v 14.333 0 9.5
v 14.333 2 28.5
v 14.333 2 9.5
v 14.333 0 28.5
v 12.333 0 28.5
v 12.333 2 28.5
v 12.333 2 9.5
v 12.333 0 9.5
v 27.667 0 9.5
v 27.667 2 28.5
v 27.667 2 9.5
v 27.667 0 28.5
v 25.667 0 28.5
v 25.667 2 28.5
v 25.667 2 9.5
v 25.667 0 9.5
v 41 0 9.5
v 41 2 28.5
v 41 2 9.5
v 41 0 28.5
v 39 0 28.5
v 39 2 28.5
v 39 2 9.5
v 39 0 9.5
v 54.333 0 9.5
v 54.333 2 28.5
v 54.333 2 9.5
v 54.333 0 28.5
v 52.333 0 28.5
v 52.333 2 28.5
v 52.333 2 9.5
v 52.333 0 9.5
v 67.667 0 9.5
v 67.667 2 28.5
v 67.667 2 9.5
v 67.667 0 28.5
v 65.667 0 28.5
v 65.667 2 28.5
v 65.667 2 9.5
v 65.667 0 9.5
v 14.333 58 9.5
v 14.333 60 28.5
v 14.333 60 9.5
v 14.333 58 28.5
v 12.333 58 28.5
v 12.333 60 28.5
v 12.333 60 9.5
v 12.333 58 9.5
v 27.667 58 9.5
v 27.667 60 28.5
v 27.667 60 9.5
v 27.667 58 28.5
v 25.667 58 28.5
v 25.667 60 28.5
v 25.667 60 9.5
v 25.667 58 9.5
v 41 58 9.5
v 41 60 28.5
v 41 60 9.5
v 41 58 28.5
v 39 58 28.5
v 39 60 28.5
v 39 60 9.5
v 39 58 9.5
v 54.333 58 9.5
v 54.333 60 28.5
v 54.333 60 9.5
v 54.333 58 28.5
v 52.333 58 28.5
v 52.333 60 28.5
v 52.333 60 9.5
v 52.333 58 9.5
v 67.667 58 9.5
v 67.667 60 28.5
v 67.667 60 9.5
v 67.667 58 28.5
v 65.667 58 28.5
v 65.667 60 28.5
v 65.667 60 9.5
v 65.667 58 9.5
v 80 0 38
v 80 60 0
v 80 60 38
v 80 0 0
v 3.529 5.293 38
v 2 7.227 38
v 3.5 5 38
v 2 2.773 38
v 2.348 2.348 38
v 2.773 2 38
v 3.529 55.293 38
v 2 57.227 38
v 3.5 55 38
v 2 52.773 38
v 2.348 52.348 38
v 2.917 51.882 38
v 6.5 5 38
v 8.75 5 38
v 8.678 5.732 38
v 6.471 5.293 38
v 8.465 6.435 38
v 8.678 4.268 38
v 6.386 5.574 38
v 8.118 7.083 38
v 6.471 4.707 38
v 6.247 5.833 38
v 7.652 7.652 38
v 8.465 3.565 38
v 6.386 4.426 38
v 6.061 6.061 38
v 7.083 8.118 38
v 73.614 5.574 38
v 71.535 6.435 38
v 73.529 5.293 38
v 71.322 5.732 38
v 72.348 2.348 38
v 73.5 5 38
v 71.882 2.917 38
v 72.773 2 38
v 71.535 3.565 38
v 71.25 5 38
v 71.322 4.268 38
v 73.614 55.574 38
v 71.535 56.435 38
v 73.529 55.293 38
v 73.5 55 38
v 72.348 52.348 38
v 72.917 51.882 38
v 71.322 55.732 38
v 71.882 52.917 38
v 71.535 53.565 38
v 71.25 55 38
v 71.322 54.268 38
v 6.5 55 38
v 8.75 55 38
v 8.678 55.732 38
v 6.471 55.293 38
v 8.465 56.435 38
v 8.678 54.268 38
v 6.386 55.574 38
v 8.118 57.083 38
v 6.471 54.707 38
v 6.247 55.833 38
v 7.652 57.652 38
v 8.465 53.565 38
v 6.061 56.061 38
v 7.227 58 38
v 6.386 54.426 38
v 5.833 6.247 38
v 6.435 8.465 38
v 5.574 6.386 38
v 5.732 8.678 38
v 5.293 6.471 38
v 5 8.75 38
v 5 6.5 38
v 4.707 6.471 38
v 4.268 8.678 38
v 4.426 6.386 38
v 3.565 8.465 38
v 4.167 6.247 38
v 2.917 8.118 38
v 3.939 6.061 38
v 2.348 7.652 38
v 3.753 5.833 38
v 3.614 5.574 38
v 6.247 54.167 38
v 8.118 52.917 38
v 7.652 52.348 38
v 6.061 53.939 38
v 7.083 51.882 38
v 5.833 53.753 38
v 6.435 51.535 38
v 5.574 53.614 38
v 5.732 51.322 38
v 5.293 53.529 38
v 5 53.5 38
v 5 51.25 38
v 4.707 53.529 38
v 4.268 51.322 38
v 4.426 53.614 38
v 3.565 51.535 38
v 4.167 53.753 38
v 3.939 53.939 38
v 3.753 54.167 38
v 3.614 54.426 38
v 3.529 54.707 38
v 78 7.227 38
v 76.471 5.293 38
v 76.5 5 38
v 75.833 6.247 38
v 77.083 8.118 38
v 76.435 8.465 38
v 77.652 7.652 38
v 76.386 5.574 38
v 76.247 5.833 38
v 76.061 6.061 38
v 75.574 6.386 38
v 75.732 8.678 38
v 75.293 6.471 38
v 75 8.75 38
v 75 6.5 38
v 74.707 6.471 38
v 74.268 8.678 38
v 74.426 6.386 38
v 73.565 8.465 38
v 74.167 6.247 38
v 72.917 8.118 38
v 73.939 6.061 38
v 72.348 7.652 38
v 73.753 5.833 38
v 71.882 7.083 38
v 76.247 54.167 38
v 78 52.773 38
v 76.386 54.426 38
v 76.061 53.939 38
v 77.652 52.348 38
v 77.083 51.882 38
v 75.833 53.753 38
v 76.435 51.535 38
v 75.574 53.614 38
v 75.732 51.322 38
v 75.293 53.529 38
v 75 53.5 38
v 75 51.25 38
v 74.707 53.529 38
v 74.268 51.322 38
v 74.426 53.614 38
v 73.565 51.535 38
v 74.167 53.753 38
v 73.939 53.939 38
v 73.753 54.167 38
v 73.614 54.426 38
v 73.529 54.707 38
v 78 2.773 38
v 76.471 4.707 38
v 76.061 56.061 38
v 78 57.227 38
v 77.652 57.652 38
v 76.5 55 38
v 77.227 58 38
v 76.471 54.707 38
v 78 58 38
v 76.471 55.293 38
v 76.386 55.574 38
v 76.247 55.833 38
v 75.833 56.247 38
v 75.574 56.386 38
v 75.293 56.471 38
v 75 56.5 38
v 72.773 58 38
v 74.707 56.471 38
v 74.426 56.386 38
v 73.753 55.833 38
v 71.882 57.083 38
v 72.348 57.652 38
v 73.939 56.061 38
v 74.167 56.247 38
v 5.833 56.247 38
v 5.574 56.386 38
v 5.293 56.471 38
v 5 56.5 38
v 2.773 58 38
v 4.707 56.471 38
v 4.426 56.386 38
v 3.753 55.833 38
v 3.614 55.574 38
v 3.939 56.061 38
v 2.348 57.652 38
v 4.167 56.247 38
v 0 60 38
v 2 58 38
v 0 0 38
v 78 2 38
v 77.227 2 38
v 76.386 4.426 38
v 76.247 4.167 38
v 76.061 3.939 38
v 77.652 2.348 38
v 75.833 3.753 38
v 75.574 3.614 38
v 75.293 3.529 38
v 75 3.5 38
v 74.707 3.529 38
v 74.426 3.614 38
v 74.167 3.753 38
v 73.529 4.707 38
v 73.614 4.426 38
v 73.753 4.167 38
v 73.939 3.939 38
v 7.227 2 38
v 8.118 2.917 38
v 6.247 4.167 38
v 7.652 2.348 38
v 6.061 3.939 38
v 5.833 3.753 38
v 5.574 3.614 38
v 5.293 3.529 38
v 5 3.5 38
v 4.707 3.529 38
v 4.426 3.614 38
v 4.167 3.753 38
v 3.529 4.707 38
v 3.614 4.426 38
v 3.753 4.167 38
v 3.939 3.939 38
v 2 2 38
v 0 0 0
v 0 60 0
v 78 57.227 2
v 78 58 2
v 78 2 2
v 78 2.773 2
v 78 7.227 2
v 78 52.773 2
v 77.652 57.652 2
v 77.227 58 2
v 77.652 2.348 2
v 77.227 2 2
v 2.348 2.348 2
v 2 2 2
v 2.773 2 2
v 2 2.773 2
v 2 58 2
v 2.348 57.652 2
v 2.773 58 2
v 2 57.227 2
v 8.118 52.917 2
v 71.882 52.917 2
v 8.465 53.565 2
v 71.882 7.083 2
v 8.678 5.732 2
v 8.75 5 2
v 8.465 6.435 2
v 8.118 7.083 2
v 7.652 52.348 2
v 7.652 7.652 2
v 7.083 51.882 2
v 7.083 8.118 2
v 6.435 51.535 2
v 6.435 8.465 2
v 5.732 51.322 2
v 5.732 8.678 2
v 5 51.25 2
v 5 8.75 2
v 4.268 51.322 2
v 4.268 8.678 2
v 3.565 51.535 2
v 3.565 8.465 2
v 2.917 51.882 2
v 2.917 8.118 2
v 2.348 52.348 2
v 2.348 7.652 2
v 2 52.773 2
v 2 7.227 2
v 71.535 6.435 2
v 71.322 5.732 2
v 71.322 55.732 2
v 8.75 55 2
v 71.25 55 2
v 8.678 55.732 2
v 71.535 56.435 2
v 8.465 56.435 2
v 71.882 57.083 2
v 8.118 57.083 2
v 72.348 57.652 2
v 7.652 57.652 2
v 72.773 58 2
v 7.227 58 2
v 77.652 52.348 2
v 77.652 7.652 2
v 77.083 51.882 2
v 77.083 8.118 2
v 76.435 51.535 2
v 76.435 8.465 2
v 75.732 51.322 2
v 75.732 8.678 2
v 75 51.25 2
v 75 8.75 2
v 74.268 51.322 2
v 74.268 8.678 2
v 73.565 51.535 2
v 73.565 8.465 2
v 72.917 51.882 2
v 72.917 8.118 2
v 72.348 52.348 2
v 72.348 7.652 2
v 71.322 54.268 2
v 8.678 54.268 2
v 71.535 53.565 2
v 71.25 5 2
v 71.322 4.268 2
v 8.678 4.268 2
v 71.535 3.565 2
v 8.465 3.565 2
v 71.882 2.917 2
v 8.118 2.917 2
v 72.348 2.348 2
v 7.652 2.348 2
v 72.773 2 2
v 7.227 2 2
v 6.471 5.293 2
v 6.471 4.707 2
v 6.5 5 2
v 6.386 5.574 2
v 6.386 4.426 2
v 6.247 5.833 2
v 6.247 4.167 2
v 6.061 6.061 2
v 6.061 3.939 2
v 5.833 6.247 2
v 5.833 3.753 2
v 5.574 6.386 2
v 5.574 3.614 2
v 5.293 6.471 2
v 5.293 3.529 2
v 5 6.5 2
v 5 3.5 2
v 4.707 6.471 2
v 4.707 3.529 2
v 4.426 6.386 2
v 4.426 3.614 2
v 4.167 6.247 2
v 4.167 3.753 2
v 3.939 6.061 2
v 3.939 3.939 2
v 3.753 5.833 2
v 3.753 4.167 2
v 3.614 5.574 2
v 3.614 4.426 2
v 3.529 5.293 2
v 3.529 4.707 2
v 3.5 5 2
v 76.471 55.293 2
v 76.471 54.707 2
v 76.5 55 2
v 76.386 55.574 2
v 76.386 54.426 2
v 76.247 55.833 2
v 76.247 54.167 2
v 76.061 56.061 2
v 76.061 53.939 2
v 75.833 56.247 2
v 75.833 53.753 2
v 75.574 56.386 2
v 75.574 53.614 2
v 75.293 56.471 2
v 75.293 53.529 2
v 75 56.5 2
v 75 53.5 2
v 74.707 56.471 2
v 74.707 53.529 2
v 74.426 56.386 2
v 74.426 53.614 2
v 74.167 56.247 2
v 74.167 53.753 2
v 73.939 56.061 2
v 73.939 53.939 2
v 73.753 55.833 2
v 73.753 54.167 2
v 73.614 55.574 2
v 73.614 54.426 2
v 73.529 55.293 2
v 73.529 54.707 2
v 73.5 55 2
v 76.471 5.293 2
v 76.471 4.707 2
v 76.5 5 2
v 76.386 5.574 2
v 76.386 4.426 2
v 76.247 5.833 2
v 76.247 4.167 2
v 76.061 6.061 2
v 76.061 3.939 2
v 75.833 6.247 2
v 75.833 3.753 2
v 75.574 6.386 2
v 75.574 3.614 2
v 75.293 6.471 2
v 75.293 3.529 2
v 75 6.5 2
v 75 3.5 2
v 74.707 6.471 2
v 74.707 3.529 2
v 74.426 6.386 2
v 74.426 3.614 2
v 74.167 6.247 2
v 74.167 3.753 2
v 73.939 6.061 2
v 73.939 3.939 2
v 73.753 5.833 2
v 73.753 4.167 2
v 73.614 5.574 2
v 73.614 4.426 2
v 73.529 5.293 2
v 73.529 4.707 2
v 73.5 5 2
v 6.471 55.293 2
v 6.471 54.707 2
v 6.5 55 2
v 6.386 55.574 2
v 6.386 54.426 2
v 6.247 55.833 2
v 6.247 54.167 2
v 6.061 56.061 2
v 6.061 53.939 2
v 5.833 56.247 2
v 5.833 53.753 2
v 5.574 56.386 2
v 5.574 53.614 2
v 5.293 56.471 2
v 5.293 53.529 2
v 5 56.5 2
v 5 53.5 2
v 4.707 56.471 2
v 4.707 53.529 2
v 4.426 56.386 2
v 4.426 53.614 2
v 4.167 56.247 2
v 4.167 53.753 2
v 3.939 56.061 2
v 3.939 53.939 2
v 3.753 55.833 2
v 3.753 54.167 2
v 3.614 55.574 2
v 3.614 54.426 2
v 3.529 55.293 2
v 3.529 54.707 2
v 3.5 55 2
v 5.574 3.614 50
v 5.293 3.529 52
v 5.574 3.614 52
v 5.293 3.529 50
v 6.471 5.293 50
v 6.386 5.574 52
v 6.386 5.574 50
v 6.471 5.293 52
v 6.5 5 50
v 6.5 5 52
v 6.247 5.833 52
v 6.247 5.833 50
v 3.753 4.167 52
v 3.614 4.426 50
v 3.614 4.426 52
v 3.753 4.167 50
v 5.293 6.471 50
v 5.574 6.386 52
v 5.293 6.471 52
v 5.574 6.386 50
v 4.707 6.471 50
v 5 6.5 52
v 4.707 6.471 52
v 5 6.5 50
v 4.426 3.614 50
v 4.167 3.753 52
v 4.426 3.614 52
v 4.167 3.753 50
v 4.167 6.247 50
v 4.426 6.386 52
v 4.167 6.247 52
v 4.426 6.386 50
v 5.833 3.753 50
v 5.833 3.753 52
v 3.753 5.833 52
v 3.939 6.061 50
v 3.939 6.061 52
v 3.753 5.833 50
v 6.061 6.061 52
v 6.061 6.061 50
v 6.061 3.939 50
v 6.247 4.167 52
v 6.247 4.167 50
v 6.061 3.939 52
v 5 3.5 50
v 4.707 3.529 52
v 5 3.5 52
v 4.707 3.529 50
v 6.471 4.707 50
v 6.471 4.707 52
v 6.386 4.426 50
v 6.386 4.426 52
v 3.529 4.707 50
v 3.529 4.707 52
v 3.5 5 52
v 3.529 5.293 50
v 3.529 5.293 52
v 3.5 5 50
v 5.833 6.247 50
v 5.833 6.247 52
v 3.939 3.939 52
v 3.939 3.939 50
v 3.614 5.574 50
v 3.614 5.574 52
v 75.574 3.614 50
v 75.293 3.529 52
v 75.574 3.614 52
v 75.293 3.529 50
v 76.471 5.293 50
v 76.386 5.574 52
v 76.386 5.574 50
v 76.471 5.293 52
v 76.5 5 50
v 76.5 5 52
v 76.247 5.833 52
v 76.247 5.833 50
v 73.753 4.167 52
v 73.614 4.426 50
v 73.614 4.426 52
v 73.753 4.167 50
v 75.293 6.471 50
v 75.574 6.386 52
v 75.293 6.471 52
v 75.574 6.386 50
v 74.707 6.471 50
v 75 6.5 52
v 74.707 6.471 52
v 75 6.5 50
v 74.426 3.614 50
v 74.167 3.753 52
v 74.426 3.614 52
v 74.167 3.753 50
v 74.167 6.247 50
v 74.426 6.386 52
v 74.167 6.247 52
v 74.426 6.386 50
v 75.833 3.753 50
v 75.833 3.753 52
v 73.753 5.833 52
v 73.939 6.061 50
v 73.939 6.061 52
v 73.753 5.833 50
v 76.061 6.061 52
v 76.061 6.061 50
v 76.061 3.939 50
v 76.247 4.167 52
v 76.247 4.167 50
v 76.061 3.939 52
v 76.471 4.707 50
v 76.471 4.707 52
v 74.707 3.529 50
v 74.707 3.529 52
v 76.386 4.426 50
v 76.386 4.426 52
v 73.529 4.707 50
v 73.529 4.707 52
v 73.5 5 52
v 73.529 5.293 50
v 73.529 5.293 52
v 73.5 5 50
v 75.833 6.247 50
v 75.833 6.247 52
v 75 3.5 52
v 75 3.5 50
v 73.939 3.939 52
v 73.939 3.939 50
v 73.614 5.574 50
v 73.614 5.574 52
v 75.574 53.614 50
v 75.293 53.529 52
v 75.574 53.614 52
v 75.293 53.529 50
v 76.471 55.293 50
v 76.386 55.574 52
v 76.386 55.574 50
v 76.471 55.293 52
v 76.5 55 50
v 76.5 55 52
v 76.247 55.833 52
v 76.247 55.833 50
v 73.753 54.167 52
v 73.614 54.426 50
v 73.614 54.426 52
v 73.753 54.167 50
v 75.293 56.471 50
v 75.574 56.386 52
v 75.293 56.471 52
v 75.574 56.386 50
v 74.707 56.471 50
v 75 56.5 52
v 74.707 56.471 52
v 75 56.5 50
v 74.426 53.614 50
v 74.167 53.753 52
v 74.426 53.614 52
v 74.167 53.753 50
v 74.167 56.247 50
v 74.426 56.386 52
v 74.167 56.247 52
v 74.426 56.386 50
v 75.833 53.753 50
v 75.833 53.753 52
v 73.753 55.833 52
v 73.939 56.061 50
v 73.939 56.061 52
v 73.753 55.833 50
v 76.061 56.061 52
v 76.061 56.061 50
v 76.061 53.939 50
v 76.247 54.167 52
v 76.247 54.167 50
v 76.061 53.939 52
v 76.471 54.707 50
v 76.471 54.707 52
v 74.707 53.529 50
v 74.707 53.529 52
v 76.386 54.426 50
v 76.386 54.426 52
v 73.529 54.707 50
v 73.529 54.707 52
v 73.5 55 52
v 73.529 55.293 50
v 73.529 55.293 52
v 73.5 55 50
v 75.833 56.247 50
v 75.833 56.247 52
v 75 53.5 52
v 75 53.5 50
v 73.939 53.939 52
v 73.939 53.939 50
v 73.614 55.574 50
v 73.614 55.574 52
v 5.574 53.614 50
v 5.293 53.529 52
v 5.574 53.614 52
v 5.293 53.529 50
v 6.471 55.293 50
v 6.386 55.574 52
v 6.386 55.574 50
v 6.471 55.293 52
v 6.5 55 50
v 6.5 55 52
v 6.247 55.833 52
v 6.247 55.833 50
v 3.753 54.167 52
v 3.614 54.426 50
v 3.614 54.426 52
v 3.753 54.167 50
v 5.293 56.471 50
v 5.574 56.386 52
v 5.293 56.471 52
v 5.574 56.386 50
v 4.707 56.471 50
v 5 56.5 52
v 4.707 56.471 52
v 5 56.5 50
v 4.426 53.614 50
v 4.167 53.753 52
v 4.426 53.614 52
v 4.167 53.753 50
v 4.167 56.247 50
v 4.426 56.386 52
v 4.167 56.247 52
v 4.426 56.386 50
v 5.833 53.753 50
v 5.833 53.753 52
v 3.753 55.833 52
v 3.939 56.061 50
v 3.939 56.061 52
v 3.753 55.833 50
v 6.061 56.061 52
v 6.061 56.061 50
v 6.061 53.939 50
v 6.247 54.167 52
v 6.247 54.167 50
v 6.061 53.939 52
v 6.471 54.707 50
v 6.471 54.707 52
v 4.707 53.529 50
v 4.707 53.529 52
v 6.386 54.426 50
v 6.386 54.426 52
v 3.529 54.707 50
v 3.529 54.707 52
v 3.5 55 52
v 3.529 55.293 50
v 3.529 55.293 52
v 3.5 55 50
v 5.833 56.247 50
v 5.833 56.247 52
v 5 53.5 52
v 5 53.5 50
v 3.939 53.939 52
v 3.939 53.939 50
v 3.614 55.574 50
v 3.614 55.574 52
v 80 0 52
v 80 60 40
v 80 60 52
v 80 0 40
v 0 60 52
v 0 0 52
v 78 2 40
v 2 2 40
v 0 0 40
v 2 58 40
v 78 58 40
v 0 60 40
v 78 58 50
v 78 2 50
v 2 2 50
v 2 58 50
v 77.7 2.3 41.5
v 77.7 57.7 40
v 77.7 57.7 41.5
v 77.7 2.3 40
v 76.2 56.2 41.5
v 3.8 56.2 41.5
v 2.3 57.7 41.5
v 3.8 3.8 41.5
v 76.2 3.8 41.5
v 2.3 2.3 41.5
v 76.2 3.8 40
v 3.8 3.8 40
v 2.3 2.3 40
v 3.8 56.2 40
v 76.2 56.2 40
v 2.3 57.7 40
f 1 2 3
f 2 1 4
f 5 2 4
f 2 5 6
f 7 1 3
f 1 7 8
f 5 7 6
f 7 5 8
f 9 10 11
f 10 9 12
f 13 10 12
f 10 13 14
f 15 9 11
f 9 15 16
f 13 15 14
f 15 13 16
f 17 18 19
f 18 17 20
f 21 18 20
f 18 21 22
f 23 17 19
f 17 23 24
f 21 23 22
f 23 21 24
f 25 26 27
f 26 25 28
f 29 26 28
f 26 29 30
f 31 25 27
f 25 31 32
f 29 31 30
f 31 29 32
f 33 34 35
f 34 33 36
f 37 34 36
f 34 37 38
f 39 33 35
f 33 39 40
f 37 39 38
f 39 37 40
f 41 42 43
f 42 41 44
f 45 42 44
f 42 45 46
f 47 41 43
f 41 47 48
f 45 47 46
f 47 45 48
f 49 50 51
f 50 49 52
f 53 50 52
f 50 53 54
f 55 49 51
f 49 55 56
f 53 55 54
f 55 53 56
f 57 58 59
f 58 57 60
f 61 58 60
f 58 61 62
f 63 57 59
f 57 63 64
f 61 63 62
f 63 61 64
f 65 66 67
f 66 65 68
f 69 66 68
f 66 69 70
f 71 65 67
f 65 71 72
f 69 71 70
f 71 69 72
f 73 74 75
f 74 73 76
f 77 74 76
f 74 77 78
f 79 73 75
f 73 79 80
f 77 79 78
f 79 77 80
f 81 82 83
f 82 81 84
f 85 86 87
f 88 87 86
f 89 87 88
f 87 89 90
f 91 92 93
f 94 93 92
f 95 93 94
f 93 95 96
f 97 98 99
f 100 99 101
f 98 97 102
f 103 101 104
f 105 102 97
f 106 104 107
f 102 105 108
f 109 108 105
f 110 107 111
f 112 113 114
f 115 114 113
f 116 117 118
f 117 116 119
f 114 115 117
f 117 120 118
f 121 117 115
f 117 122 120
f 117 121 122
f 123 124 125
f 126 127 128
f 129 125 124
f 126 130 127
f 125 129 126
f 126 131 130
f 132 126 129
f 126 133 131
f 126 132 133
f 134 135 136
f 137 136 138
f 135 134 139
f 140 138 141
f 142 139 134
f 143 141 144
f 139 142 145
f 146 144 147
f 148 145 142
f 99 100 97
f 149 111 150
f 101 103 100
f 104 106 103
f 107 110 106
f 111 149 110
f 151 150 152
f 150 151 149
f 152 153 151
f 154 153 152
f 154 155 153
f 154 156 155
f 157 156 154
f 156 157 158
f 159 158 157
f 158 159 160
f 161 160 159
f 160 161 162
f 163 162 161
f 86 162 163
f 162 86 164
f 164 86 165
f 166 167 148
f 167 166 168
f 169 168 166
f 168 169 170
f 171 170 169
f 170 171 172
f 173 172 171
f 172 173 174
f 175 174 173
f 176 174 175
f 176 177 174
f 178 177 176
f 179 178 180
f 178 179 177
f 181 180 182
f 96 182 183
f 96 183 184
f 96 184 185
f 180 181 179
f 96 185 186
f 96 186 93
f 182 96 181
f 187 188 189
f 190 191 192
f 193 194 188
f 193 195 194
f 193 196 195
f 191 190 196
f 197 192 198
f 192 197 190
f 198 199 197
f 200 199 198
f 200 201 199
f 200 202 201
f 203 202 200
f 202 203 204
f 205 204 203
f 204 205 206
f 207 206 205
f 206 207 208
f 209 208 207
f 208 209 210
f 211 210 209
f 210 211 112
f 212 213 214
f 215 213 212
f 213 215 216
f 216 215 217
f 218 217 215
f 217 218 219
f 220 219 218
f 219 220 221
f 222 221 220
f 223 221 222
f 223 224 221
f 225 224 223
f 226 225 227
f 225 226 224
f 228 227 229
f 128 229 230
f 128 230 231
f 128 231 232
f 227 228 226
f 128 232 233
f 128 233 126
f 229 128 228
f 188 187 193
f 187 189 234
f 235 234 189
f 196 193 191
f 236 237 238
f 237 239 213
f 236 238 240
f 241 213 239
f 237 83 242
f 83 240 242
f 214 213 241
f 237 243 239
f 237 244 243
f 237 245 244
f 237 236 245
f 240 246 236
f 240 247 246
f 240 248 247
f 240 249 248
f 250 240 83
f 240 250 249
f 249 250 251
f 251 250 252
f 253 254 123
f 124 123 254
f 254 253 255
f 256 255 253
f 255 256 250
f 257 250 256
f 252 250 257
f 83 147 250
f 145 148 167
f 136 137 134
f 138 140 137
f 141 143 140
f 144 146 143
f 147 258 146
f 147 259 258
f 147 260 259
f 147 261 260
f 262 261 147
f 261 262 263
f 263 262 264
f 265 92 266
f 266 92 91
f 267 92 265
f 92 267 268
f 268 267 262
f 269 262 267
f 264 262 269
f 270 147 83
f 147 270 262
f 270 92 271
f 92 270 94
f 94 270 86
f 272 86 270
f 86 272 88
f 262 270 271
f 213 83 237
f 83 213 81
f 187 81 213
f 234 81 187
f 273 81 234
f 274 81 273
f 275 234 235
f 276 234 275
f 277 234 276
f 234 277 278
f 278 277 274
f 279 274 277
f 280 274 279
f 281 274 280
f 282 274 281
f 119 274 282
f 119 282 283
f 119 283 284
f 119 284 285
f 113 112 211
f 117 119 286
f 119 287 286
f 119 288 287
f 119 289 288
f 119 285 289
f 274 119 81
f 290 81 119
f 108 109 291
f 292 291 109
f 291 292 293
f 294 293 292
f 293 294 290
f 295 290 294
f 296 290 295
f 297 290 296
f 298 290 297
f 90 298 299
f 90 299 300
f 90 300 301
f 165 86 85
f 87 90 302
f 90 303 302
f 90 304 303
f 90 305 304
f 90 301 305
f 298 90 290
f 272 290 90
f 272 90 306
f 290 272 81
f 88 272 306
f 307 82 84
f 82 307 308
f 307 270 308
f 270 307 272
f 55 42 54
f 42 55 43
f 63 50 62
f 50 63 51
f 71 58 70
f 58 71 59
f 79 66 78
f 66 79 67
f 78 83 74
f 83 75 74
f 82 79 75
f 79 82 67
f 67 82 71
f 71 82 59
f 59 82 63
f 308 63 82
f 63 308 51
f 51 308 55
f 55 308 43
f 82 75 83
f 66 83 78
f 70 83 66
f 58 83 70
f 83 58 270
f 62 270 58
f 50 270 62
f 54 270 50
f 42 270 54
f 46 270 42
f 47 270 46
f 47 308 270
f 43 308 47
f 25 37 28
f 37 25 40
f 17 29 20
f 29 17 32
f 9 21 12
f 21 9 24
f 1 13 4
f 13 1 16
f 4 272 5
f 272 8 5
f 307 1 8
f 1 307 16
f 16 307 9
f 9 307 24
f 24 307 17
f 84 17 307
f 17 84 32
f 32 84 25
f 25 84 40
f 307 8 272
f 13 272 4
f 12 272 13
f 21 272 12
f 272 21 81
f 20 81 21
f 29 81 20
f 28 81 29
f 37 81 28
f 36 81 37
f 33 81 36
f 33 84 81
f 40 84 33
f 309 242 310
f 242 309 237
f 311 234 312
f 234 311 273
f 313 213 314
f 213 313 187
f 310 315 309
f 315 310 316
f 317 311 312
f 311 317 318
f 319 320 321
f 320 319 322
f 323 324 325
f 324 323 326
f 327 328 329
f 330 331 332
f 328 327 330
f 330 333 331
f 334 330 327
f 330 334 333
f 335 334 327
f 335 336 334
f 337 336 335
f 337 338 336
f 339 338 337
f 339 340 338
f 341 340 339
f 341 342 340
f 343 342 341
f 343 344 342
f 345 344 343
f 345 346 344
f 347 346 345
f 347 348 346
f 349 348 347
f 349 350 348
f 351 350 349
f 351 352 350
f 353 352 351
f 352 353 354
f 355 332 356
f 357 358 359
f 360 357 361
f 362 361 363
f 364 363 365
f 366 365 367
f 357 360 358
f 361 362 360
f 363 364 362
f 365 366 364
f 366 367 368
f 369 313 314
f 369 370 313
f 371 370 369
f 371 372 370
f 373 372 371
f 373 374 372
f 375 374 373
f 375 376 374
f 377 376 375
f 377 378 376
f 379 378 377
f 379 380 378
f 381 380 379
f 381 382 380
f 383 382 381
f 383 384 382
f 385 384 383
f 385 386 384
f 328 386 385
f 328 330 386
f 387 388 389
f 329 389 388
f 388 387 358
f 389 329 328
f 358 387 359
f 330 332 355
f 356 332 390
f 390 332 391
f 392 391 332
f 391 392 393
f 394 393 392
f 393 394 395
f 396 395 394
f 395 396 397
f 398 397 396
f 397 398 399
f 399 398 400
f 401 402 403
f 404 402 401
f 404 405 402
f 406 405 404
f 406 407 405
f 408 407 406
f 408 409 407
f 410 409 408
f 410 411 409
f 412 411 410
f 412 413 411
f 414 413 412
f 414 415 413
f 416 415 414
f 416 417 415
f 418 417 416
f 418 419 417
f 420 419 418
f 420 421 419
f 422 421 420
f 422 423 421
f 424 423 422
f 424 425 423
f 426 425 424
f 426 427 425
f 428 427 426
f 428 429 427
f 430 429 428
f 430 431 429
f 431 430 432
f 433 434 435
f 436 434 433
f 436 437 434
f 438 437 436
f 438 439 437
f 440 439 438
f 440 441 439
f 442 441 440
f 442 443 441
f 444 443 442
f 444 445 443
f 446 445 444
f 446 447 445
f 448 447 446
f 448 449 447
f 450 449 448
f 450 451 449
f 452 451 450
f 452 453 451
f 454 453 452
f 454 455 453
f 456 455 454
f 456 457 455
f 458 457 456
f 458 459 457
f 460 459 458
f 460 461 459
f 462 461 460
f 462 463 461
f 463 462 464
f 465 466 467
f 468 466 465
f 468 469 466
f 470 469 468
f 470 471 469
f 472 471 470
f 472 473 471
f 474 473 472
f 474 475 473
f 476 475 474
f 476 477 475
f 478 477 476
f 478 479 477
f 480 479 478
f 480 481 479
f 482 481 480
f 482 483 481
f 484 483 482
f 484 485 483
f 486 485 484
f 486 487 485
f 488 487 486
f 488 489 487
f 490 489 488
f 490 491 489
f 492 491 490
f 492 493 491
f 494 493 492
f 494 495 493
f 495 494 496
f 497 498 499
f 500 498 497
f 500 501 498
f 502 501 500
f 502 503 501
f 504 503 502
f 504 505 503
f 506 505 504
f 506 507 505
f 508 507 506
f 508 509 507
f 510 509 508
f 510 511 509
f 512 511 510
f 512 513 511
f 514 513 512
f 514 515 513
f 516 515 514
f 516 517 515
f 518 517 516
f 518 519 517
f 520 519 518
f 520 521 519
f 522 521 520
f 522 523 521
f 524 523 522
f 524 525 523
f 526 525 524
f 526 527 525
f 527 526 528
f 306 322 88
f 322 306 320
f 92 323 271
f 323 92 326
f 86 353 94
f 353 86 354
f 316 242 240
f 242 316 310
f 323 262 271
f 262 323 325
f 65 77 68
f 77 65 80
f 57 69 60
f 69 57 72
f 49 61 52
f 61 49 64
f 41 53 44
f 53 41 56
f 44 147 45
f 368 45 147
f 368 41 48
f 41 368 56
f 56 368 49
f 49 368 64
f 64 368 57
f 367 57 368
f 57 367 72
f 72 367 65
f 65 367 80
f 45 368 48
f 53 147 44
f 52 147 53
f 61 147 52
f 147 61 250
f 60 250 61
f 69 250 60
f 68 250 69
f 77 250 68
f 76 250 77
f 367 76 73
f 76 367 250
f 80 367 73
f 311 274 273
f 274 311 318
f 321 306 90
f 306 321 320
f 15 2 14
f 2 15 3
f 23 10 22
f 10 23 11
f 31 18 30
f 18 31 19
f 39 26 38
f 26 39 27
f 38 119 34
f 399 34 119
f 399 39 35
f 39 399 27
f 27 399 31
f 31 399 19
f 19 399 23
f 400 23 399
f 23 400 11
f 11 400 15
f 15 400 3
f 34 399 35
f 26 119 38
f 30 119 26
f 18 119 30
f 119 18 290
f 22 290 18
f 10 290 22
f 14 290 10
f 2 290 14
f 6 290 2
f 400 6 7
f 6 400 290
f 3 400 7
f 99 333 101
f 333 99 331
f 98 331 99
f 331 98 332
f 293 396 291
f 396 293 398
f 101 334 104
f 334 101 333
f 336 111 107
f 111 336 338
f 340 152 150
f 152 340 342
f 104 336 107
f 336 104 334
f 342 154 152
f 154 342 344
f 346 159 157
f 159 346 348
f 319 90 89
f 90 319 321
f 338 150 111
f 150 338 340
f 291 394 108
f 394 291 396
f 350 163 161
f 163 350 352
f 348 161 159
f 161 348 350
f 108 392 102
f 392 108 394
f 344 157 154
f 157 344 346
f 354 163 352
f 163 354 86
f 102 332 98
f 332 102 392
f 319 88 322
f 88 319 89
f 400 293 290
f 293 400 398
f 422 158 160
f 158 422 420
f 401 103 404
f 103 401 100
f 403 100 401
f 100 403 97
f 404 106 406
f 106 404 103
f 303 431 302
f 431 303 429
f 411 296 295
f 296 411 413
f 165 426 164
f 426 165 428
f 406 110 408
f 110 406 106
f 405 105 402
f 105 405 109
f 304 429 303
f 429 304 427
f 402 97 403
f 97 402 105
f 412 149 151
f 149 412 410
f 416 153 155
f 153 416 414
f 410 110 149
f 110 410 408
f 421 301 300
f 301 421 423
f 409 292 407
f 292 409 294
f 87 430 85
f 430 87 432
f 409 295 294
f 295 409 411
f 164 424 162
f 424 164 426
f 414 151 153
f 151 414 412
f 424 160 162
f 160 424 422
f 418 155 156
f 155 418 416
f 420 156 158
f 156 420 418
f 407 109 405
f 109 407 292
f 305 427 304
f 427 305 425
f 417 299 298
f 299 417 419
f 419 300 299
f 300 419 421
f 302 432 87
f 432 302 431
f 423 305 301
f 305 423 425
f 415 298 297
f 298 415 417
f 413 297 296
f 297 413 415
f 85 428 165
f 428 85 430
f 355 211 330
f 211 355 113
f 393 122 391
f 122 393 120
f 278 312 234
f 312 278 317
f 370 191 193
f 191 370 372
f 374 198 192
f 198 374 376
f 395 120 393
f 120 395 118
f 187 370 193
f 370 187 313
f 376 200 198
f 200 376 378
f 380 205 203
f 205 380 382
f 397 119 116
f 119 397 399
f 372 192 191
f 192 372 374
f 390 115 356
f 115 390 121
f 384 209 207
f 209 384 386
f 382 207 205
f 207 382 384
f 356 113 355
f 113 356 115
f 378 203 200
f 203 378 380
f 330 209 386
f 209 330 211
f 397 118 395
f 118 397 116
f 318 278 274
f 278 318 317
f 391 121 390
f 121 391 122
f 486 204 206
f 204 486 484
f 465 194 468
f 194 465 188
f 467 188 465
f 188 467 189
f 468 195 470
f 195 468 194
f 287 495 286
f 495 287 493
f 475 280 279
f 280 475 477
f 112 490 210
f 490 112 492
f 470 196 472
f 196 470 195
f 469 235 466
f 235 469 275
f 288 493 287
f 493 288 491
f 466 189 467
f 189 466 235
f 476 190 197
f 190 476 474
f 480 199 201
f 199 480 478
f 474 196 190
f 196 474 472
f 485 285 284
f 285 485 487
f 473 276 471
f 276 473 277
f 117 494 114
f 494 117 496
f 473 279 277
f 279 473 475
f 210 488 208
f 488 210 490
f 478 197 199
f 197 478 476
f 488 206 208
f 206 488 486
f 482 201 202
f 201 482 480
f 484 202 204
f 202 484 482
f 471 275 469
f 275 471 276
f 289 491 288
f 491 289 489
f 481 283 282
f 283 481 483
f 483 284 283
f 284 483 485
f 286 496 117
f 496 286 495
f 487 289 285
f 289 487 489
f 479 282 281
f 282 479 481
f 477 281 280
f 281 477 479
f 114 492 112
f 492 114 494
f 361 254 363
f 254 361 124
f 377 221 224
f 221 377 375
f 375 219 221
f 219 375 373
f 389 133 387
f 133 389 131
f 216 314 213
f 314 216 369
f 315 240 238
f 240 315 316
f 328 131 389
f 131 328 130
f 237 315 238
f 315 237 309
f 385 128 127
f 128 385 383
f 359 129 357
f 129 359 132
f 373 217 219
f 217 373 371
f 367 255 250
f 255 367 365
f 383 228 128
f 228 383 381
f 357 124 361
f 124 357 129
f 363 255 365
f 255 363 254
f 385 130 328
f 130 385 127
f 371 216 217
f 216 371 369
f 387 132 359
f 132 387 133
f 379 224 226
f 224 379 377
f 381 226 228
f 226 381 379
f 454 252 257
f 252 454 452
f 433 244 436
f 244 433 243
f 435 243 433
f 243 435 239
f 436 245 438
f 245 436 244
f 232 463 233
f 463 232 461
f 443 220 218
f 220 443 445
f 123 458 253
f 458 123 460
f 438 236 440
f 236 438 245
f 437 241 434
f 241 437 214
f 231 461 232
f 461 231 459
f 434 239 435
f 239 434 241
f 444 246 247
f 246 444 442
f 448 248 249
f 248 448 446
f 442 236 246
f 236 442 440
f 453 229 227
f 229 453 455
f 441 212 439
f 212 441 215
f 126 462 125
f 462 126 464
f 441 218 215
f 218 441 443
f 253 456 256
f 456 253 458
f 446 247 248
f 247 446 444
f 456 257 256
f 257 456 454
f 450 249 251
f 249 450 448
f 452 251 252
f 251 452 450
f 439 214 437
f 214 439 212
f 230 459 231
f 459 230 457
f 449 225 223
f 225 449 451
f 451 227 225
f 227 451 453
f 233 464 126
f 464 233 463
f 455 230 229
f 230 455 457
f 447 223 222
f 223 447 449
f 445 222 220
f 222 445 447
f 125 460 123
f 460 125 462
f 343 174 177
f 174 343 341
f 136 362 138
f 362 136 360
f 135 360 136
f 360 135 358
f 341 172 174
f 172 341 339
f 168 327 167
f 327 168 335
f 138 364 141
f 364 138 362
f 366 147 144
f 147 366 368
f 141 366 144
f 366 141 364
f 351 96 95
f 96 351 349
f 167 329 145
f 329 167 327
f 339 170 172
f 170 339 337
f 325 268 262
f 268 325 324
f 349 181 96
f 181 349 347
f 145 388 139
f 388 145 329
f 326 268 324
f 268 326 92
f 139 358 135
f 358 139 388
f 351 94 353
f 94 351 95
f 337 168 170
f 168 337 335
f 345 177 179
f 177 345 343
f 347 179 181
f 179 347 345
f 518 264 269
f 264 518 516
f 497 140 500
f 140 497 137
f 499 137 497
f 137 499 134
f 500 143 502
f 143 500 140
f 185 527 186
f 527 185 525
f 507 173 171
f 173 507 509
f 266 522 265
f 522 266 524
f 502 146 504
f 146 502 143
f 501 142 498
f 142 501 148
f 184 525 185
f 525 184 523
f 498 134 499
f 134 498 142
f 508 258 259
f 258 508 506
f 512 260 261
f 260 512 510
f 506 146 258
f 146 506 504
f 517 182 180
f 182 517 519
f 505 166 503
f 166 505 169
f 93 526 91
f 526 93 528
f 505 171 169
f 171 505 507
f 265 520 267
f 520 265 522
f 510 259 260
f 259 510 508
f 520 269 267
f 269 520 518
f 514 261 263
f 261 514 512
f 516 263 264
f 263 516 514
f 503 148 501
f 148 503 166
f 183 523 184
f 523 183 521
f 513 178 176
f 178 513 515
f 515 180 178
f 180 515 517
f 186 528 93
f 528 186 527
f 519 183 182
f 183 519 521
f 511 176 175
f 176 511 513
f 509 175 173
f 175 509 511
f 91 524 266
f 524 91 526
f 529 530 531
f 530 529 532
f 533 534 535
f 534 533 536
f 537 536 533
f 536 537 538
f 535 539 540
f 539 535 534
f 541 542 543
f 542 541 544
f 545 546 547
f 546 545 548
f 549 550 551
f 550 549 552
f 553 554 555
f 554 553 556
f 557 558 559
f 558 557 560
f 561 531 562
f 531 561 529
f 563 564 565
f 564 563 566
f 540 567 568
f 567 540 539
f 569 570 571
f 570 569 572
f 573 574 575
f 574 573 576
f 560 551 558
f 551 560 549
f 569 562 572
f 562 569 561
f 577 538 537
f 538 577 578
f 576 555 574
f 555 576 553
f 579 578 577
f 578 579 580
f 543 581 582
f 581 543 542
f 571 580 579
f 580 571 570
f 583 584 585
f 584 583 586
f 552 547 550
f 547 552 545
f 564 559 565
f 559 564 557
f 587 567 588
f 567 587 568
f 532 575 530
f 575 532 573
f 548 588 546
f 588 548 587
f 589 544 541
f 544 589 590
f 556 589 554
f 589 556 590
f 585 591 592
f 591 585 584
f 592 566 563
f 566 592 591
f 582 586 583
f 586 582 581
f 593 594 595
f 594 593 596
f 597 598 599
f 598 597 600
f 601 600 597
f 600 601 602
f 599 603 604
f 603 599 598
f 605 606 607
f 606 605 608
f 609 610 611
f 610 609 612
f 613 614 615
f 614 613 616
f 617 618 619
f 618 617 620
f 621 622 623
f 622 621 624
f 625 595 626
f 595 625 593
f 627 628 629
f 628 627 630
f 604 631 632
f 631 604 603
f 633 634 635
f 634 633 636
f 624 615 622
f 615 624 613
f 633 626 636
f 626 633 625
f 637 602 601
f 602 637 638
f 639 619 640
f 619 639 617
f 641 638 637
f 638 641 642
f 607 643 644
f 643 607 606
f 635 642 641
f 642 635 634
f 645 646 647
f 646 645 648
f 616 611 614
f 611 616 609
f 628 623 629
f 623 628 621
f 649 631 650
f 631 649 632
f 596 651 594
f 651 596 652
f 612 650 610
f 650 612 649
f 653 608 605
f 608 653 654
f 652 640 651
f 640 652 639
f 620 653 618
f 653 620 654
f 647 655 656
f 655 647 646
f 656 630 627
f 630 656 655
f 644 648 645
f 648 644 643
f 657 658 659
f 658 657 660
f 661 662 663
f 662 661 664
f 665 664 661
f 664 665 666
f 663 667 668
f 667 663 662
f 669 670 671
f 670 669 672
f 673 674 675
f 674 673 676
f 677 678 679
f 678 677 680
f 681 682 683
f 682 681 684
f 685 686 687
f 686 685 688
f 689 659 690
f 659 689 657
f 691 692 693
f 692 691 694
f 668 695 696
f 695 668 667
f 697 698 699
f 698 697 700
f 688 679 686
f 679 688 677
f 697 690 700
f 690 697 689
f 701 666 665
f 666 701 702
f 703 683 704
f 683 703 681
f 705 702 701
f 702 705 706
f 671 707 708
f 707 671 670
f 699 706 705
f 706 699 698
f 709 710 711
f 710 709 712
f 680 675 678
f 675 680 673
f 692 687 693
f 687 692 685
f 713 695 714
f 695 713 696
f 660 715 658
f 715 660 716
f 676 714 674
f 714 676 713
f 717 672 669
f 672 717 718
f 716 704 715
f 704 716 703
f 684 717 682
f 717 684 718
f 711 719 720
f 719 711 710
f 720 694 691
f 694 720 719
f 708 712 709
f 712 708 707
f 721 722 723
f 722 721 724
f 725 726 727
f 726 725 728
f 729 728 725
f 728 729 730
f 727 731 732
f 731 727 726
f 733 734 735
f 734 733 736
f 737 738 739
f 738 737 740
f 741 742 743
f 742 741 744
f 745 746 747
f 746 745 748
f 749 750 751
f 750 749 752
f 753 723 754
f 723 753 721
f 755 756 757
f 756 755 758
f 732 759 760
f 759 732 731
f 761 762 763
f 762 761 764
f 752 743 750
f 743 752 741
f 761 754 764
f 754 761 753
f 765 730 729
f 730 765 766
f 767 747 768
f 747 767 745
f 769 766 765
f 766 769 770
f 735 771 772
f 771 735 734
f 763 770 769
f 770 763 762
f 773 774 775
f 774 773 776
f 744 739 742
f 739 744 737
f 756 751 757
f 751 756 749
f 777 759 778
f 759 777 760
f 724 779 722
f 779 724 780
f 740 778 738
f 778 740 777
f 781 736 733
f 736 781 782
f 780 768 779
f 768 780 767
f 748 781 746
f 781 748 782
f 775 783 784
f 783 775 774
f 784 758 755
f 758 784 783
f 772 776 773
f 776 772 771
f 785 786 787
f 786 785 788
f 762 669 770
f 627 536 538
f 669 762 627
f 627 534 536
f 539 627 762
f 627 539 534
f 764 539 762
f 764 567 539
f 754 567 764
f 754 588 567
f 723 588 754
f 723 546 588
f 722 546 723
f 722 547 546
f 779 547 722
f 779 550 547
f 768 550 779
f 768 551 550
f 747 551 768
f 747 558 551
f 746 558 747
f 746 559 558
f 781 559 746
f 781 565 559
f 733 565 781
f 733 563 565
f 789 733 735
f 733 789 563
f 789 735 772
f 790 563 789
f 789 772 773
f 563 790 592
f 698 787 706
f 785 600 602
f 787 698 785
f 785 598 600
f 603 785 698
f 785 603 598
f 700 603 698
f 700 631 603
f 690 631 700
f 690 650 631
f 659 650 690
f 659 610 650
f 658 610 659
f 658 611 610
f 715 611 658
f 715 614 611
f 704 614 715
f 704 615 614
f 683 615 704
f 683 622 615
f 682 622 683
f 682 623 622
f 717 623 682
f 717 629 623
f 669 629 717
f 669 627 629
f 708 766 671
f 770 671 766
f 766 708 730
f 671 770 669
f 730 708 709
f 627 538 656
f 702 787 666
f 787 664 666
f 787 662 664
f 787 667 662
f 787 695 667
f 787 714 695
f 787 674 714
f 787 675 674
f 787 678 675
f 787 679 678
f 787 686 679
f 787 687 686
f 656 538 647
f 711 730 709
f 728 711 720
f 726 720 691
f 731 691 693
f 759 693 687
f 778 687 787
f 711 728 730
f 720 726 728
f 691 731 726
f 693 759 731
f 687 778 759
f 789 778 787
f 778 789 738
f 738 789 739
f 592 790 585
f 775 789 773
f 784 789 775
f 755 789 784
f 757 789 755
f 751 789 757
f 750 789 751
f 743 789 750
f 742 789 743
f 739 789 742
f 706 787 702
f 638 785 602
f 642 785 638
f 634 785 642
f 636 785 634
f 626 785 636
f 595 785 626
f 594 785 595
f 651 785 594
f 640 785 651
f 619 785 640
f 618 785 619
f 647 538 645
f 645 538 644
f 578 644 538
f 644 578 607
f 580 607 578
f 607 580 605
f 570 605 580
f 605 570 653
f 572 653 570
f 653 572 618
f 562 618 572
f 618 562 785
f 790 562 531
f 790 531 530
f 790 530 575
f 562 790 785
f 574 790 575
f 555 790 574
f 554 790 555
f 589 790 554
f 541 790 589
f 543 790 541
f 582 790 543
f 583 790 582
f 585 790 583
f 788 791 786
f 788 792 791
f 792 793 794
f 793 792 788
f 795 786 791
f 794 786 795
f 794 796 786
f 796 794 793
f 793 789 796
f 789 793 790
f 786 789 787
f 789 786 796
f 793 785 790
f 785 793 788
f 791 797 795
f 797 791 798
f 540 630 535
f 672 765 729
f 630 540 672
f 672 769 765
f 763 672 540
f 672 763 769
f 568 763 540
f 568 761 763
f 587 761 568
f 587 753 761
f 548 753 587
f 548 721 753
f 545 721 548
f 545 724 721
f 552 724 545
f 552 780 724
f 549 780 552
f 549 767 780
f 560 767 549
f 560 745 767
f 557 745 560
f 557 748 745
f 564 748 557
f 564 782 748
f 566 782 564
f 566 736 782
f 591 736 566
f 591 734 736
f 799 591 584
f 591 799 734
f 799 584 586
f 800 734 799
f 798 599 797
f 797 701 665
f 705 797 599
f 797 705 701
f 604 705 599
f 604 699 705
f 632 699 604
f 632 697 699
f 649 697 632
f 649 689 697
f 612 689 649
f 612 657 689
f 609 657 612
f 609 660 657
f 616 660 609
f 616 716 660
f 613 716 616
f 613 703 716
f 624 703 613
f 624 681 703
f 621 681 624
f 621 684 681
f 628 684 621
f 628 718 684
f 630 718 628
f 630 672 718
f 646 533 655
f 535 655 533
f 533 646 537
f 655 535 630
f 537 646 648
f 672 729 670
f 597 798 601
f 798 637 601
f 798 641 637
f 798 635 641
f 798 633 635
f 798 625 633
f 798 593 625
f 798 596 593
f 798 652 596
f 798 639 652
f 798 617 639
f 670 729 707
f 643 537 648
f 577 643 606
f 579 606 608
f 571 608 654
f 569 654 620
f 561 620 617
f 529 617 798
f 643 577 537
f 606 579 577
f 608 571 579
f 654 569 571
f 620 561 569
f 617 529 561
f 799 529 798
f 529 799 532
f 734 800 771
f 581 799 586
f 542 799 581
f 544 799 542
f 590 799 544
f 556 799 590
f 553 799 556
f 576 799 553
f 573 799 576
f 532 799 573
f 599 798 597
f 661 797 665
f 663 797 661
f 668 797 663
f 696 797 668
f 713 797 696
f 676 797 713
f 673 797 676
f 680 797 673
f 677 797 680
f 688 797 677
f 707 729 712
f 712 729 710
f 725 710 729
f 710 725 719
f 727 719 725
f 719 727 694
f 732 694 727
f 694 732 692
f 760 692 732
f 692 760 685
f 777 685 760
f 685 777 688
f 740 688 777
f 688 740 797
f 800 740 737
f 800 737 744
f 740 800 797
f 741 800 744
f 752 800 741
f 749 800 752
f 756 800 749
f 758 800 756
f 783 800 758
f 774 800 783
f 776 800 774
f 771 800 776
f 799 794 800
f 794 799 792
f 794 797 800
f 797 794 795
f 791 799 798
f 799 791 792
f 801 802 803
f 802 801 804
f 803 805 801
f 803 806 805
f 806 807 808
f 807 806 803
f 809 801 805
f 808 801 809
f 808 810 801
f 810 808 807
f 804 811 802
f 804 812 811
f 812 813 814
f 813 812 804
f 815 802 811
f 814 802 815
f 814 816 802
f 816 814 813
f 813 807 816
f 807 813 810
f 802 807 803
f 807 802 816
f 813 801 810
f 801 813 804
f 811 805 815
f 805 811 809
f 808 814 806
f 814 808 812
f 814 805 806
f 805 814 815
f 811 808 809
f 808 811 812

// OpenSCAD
// file: ../lib/validate-project.scad
// validate-project.scad — Project-specific validators (project-owned, never overwritten by harness)
// Base validators live in validate.scad (refreshable via harness init --openscad --refresh)
//
// Add project-specific validators here. Examples:
//   validate_wire_channel(diameter)    — for cable routing parts
//   validate_bore_fit(inner, outer)    — for press-fit assemblies
//   validate_build_plate(x, y, z)     — for printer-specific size limits
//
// Call-site parameterization for material overrides:
//   Base validators already accept parameters with defaults. Override at the call site:
//     validate_wall_thickness("wall", wall, min_wall=1.2);  // PETG override
//     validate_wall_thickness("wall", wall);                  // default 0.8 (PLA)
//   No wrapper modules or config files needed.

use <validate.scad>

// --- Project-specific validators below ---
// Add your project's custom validators here.
// They can call base validators internally if needed.

// Example: Validate part fits on build plate
// module validate_build_plate(name, x, y, z, max_x=220, max_y=220, max_z=250) {
//     assert(x <= max_x, str("GATE FAIL: ", name, " x=", x, "mm > ", max_x, "mm build plate width"));
//     assert(y <= max_y, str("GATE FAIL: ", name, " y=", y, "mm > ", max_y, "mm build plate depth"));
//     assert(z <= max_z, str("GATE FAIL: ", name, " z=", z, "mm > ", max_z, "mm build plate height"));
// }
// file: ../lib/validate.scad
// validate.scad — BASE Layer 1 parameter validation library (refreshable)
// Refreshable via: harness init --openscad --refresh
// DO NOT add project-specific validators here — use validate-project.scad instead.
//
// Pattern: assert() gates with GATE FAIL: prefix for grep-able error extraction
// Usage: use <../lib/validate.scad> then call validate_* modules

// Validate a numeric parameter is within bounds
// Fails with GATE FAIL: prefix and interpolated values
module validate_range(name, value, min_val, max_val) {
    assert(value >= min_val,
        str("GATE FAIL: ", name, "=", value, " < ", min_val, " minimum"));
    assert(value <= max_val,
        str("GATE FAIL: ", name, "=", value, " > ", max_val, " maximum"));
}

// Validate a dimension is positive
module validate_positive(name, value) {
    assert(value > 0,
        str("GATE FAIL: ", name, "=", value, " must be positive"));
}

// Validate wall thickness meets printability minimum
module validate_wall_thickness(name, value, min_wall=0.8) {
    assert(value >= min_wall,
        str("GATE FAIL: ", name, "=", value, "mm < ", min_wall, "mm minimum wall thickness"));
}

// Validate $fn is reasonable for printable curves
module validate_fn(fn_val, min_fn=16, max_fn=256) {
    assert(fn_val >= min_fn,
        str("GATE FAIL: $fn=", fn_val, " < ", min_fn, " (too coarse for printable curves)"));
    assert(fn_val <= max_fn,
        str("GATE FAIL: $fn=", fn_val, " > ", max_fn, " (excessive polygon count)"));
}

// Validate hole diameter is printable
module validate_hole(name, diameter, min_diameter=1.0) {
    assert(diameter >= min_diameter,
        str("GATE FAIL: ", name, "=", diameter, "mm < ", min_diameter, "mm minimum hole diameter"));
}

// Validate that interior space exists (wall doesn't consume entire dimension)
module validate_interior(dim_name, dim_value, wall_name, wall_value) {
    assert(wall_value < dim_value / 2,
        str("GATE FAIL: ", wall_name, "=", wall_value,
            " >= ", dim_name, "/2=", dim_value/2, " (no interior space)"));
}

// Batch validate common bracket/enclosure parameters
// This is the recommended entry point for simple parts
module validate_part(width, height, depth, wall_thickness,
                     fn=32, holes=[], min_wall=0.8) {
    validate_positive("width", width);
    validate_positive("height", height);
    validate_positive("depth", depth);
    validate_wall_thickness("wall_thickness", wall_thickness, min_wall);
    validate_fn(fn);
    validate_interior("width", width, "wall_thickness", wall_thickness);
    validate_interior("depth", depth, "wall_thickness", wall_thickness);

    // Validate each hole diameter if provided
    for (i = [0:len(holes)-1]) {
        validate_hole(str("hole[", i, "]"), holes[i]);
    }
}
// main file
// enclosure.scad — Parametric electronics enclosure with lid and ventilation
// Demonstrates: interior space validation, lid/base separation, vent slots

// --- Parameters (override via -D flags) ---
width = 80;            // mm — outer width
height = 50;           // mm — outer height (base + lid)
depth = 60;            // mm — outer depth
wall_thickness = 2;    // mm (minimum 0.8mm for FDM)
lid_height = 12;       // mm — height of lid portion
lip_depth = 1.5;       // mm — interlocking lip depth
lip_clearance = 0.3;   // mm — clearance for lid fit
screw_diameter = 3;    // mm — corner screw holes
vent_slot_width = 2;   // mm — ventilation slot width
vent_slot_count = 5;   // number of vent slots per side
fn = 32;               // facet count for curves

// --- Layer 1: Parameter Validation ---
use <../lib/validate.scad>
use <../lib/validate-project.scad>

validate_part(width, height, depth, wall_thickness, fn,
              holes=[screw_diameter]);
validate_range("lid_height", lid_height, wall_thickness + 1, height - wall_thickness - 1);
validate_range("lip_depth", lip_depth, 0.5, wall_thickness - 0.5);
validate_range("lip_clearance", lip_clearance, 0.1, 1.0);
validate_positive("vent_slot_width", vent_slot_width);
validate_range("vent_slot_count", vent_slot_count, 0, 20);

// Derived dimensions
base_height = height - lid_height;

// Advisory warnings
if (wall_thickness < 1.5)
    echo("WARN: wall_thickness=", wall_thickness, "mm may be fragile for an enclosure");
if (lip_clearance > 0.5)
    echo("WARN: lip_clearance=", lip_clearance, "mm is loose — lid may rattle");

// --- Geometry ---

module screw_posts() {
    inset = wall_thickness + screw_diameter;
    positions = [
        [inset, inset],
        [width - inset, inset],
        [width - inset, depth - inset],
        [inset, depth - inset]
    ];
    for (pos = positions) {
        translate([pos[0], pos[1], 0])
            difference() {
                cylinder(d=screw_diameter * 2.5, h=base_height - wall_thickness, $fn=fn);
                cylinder(d=screw_diameter, h=base_height - wall_thickness + 1, $fn=fn);
            }
    }
}

module vent_slots(face_width, face_height) {
    if (vent_slot_count > 0) {
        slot_spacing = face_width / (vent_slot_count + 1);
        slot_height = face_height * 0.5;
        for (i = [1:vent_slot_count]) {
            translate([slot_spacing * i - vent_slot_width / 2,
                       -1,
                       face_height * 0.25])
                cube([vent_slot_width, wall_thickness + 2, slot_height]);
        }
    }
}

module enclosure_base() {
    difference() {
        // Outer shell
        cube([width, depth, base_height]);

        // Hollow interior
        translate([wall_thickness, wall_thickness, wall_thickness])
            cube([width - 2 * wall_thickness,
                  depth - 2 * wall_thickness,
                  base_height]);

        // Vent slots on front face
        vent_slots(width, base_height);

        // Vent slots on back face
        translate([0, depth - wall_thickness, 0])
            vent_slots(width, base_height);
    }

    // Screw posts
    translate([0, 0, wall_thickness])
        screw_posts();
}

module enclosure_lid() {
    translate([0, 0, base_height + 2]) {  // Offset for visibility
        difference() {
            // Outer lid
            cube([width, depth, lid_height]);

            // Hollow interior
            translate([wall_thickness, wall_thickness, 0])
                cube([width - 2 * wall_thickness,
                      depth - 2 * wall_thickness,
                      lid_height - wall_thickness]);

            // Screw holes through lid corners
            inset = wall_thickness + screw_diameter;
            positions = [
                [inset, inset],
                [width - inset, inset],
                [width - inset, depth - inset],
                [inset, depth - inset]
            ];
            for (pos = positions) {
                translate([pos[0], pos[1], -1])
                    cylinder(d=screw_diameter, h=lid_height + 2, $fn=fn);
            }
        }

        // Interlocking lip
        translate([wall_thickness + lip_clearance,
                   wall_thickness + lip_clearance, 0])
            difference() {
                cube([width - 2 * (wall_thickness + lip_clearance),
                      depth - 2 * (wall_thickness + lip_clearance),
                      lip_depth]);
                translate([lip_depth, lip_depth, -1])
                    cube([width - 2 * (wall_thickness + lip_clearance + lip_depth),
                          depth - 2 * (wall_thickness + lip_clearance + lip_depth),
                          lip_depth + 2]);
            }
    }
}

enclosure_base();
enclosure_lid();
